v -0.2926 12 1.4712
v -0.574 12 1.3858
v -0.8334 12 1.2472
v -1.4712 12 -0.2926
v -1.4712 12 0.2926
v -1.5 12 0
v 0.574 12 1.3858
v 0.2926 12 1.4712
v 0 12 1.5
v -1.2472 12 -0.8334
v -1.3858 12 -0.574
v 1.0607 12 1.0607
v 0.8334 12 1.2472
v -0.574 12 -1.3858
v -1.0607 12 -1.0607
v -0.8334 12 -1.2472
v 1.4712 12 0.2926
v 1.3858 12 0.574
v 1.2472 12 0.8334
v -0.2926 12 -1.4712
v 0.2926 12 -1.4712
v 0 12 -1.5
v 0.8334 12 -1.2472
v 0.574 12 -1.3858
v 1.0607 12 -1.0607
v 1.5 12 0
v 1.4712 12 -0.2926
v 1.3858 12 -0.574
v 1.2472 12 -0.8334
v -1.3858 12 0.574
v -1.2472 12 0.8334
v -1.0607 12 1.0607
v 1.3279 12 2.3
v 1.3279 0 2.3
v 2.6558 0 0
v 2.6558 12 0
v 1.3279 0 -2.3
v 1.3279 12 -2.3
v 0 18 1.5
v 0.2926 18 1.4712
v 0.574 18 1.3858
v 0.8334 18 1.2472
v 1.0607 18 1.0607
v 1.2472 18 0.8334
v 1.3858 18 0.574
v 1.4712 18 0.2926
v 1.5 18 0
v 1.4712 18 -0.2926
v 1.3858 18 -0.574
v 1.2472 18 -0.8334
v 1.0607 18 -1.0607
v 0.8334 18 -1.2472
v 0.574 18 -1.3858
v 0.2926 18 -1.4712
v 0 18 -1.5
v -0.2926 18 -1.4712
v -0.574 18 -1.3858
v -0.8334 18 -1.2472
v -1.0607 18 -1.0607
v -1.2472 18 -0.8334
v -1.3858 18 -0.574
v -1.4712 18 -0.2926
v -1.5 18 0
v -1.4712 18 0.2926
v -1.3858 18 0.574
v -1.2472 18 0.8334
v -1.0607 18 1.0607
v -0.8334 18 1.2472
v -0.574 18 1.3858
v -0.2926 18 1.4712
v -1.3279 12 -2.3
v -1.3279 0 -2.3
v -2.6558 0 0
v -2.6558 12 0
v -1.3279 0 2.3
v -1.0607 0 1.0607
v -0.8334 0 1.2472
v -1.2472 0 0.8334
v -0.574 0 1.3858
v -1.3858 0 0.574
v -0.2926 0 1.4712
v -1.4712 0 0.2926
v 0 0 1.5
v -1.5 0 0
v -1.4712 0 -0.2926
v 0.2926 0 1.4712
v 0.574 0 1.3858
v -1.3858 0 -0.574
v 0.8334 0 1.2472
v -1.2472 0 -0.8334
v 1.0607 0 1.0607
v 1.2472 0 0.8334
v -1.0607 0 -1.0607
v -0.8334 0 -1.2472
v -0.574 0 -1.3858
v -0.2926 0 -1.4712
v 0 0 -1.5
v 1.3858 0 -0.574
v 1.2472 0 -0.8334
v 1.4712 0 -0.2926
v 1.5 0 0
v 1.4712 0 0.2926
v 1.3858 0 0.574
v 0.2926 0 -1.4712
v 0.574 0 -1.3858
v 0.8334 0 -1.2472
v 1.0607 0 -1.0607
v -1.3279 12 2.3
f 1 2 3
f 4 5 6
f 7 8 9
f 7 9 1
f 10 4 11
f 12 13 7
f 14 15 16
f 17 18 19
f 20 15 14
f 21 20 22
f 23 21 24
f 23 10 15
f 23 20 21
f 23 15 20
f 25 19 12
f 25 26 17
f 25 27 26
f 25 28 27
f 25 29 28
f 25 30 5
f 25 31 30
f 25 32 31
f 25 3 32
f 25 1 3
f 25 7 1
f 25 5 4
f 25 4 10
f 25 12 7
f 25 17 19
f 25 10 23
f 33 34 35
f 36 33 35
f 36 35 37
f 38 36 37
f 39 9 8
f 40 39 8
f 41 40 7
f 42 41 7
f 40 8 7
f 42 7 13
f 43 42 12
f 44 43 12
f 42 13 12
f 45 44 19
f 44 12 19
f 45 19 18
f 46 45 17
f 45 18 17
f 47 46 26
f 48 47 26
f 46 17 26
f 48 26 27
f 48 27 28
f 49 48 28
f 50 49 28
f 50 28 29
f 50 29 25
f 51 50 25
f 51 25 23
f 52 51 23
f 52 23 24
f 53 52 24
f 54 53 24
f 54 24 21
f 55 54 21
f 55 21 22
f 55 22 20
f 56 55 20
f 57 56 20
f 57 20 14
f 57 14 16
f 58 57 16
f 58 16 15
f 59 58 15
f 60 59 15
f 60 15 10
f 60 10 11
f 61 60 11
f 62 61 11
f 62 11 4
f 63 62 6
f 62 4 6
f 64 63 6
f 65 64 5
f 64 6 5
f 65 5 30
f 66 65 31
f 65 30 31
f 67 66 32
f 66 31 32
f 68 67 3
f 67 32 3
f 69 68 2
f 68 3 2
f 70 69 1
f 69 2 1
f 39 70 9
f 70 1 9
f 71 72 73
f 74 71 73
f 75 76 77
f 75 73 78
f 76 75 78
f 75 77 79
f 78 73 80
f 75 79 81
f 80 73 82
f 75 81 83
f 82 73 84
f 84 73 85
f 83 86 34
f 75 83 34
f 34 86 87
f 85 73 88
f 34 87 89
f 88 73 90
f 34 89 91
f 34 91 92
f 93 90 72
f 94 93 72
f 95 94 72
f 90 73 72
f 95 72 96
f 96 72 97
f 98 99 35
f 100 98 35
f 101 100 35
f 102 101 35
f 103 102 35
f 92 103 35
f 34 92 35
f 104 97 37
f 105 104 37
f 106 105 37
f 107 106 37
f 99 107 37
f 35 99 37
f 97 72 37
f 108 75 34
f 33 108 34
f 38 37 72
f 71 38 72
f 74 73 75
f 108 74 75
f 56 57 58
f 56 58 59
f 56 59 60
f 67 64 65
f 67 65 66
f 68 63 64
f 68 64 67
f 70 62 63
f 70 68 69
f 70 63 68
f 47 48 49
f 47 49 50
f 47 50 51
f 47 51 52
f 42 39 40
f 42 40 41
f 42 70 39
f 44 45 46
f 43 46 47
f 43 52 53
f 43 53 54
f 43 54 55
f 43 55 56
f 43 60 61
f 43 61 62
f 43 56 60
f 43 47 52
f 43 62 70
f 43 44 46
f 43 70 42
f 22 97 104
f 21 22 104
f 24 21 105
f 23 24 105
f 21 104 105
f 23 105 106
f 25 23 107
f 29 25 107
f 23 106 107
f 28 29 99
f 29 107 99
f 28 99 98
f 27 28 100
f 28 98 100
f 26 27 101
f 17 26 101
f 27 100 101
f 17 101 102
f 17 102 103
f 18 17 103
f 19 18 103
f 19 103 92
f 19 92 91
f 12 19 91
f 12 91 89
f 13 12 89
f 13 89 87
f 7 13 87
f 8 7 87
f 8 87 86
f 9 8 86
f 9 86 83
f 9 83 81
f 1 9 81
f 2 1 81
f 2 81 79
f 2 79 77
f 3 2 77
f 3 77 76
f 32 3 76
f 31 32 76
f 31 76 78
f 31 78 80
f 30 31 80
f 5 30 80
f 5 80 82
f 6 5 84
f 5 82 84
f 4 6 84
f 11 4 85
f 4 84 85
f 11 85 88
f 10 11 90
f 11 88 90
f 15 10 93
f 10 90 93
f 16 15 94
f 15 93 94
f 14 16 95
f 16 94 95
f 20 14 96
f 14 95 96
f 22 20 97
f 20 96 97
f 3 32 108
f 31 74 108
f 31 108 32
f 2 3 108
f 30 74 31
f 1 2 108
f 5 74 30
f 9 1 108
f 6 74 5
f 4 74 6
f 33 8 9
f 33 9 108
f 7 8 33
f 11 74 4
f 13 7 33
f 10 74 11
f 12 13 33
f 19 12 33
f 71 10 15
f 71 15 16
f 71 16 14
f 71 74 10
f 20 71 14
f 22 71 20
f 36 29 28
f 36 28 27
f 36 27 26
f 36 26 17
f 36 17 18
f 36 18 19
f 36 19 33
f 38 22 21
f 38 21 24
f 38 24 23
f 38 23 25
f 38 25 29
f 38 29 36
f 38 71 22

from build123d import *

# Parameters (mm, degrees)
EXTRUDE_1_DEPTH     = 12
SKETCH_3_R          = 1.5
EXTRUDE_2_DEPTH     = 6
SKETCH_4_R          = 1.5
CUT_EXTRUDE_1_DEPTH = 12


with BuildPart() as part:
    # 草图1 → 凸台-拉伸1 (new body)
    with BuildSketch(Plane(origin=(0, 0, 0), x_dir=(1, 0, 0), z_dir=(0, 1, 0))):
        Polygon((-1.327905619, 2.3), (-2.655811238, 0), (-1.327905619, -2.3), (1.327905619, -2.3), (2.655811238, 0), (1.327905619, 2.3), align=None)
    extrude(amount=EXTRUDE_1_DEPTH)

    # 草图3 → 凸台-拉伸2 (add)
    with BuildSketch(Plane(origin=(0, 12, 0), x_dir=(1, 0, 0), z_dir=(0, 1, 0))):
        with Locations(Location((0, 0, 0), (0, 0, 270))):
            Circle(SKETCH_3_R)
    extrude(amount=EXTRUDE_2_DEPTH)

    # 草图4 → 切除-拉伸1 (cut)
    with BuildSketch(Plane.XZ):
        with Locations(Location((0, 0, 0), (0, 0, 270))):
            Circle(SKETCH_4_R)
    extrude(amount=-CUT_EXTRUDE_1_DEPTH, mode=Mode.SUBTRACT)


with BuildPart() as cut_extrude_1_piece_1:
    # of the separate pieces the step leaves, piece 1, a body of its own (cut_extrude_1_pieces)
    add(part.part.solids().sort_by_distance((-1.327905619, 0, -2.3))[0])


with BuildPart() as cut_extrude_1_piece_2:
    # of the separate pieces the step leaves, piece 2, a body of its own (cut_extrude_1_pieces)
    add(part.part.solids().sort_by_distance((0, 18, 1.5))[0])


solid = Compound([cut_extrude_1_piece_1.part, cut_extrude_1_piece_2.part])
